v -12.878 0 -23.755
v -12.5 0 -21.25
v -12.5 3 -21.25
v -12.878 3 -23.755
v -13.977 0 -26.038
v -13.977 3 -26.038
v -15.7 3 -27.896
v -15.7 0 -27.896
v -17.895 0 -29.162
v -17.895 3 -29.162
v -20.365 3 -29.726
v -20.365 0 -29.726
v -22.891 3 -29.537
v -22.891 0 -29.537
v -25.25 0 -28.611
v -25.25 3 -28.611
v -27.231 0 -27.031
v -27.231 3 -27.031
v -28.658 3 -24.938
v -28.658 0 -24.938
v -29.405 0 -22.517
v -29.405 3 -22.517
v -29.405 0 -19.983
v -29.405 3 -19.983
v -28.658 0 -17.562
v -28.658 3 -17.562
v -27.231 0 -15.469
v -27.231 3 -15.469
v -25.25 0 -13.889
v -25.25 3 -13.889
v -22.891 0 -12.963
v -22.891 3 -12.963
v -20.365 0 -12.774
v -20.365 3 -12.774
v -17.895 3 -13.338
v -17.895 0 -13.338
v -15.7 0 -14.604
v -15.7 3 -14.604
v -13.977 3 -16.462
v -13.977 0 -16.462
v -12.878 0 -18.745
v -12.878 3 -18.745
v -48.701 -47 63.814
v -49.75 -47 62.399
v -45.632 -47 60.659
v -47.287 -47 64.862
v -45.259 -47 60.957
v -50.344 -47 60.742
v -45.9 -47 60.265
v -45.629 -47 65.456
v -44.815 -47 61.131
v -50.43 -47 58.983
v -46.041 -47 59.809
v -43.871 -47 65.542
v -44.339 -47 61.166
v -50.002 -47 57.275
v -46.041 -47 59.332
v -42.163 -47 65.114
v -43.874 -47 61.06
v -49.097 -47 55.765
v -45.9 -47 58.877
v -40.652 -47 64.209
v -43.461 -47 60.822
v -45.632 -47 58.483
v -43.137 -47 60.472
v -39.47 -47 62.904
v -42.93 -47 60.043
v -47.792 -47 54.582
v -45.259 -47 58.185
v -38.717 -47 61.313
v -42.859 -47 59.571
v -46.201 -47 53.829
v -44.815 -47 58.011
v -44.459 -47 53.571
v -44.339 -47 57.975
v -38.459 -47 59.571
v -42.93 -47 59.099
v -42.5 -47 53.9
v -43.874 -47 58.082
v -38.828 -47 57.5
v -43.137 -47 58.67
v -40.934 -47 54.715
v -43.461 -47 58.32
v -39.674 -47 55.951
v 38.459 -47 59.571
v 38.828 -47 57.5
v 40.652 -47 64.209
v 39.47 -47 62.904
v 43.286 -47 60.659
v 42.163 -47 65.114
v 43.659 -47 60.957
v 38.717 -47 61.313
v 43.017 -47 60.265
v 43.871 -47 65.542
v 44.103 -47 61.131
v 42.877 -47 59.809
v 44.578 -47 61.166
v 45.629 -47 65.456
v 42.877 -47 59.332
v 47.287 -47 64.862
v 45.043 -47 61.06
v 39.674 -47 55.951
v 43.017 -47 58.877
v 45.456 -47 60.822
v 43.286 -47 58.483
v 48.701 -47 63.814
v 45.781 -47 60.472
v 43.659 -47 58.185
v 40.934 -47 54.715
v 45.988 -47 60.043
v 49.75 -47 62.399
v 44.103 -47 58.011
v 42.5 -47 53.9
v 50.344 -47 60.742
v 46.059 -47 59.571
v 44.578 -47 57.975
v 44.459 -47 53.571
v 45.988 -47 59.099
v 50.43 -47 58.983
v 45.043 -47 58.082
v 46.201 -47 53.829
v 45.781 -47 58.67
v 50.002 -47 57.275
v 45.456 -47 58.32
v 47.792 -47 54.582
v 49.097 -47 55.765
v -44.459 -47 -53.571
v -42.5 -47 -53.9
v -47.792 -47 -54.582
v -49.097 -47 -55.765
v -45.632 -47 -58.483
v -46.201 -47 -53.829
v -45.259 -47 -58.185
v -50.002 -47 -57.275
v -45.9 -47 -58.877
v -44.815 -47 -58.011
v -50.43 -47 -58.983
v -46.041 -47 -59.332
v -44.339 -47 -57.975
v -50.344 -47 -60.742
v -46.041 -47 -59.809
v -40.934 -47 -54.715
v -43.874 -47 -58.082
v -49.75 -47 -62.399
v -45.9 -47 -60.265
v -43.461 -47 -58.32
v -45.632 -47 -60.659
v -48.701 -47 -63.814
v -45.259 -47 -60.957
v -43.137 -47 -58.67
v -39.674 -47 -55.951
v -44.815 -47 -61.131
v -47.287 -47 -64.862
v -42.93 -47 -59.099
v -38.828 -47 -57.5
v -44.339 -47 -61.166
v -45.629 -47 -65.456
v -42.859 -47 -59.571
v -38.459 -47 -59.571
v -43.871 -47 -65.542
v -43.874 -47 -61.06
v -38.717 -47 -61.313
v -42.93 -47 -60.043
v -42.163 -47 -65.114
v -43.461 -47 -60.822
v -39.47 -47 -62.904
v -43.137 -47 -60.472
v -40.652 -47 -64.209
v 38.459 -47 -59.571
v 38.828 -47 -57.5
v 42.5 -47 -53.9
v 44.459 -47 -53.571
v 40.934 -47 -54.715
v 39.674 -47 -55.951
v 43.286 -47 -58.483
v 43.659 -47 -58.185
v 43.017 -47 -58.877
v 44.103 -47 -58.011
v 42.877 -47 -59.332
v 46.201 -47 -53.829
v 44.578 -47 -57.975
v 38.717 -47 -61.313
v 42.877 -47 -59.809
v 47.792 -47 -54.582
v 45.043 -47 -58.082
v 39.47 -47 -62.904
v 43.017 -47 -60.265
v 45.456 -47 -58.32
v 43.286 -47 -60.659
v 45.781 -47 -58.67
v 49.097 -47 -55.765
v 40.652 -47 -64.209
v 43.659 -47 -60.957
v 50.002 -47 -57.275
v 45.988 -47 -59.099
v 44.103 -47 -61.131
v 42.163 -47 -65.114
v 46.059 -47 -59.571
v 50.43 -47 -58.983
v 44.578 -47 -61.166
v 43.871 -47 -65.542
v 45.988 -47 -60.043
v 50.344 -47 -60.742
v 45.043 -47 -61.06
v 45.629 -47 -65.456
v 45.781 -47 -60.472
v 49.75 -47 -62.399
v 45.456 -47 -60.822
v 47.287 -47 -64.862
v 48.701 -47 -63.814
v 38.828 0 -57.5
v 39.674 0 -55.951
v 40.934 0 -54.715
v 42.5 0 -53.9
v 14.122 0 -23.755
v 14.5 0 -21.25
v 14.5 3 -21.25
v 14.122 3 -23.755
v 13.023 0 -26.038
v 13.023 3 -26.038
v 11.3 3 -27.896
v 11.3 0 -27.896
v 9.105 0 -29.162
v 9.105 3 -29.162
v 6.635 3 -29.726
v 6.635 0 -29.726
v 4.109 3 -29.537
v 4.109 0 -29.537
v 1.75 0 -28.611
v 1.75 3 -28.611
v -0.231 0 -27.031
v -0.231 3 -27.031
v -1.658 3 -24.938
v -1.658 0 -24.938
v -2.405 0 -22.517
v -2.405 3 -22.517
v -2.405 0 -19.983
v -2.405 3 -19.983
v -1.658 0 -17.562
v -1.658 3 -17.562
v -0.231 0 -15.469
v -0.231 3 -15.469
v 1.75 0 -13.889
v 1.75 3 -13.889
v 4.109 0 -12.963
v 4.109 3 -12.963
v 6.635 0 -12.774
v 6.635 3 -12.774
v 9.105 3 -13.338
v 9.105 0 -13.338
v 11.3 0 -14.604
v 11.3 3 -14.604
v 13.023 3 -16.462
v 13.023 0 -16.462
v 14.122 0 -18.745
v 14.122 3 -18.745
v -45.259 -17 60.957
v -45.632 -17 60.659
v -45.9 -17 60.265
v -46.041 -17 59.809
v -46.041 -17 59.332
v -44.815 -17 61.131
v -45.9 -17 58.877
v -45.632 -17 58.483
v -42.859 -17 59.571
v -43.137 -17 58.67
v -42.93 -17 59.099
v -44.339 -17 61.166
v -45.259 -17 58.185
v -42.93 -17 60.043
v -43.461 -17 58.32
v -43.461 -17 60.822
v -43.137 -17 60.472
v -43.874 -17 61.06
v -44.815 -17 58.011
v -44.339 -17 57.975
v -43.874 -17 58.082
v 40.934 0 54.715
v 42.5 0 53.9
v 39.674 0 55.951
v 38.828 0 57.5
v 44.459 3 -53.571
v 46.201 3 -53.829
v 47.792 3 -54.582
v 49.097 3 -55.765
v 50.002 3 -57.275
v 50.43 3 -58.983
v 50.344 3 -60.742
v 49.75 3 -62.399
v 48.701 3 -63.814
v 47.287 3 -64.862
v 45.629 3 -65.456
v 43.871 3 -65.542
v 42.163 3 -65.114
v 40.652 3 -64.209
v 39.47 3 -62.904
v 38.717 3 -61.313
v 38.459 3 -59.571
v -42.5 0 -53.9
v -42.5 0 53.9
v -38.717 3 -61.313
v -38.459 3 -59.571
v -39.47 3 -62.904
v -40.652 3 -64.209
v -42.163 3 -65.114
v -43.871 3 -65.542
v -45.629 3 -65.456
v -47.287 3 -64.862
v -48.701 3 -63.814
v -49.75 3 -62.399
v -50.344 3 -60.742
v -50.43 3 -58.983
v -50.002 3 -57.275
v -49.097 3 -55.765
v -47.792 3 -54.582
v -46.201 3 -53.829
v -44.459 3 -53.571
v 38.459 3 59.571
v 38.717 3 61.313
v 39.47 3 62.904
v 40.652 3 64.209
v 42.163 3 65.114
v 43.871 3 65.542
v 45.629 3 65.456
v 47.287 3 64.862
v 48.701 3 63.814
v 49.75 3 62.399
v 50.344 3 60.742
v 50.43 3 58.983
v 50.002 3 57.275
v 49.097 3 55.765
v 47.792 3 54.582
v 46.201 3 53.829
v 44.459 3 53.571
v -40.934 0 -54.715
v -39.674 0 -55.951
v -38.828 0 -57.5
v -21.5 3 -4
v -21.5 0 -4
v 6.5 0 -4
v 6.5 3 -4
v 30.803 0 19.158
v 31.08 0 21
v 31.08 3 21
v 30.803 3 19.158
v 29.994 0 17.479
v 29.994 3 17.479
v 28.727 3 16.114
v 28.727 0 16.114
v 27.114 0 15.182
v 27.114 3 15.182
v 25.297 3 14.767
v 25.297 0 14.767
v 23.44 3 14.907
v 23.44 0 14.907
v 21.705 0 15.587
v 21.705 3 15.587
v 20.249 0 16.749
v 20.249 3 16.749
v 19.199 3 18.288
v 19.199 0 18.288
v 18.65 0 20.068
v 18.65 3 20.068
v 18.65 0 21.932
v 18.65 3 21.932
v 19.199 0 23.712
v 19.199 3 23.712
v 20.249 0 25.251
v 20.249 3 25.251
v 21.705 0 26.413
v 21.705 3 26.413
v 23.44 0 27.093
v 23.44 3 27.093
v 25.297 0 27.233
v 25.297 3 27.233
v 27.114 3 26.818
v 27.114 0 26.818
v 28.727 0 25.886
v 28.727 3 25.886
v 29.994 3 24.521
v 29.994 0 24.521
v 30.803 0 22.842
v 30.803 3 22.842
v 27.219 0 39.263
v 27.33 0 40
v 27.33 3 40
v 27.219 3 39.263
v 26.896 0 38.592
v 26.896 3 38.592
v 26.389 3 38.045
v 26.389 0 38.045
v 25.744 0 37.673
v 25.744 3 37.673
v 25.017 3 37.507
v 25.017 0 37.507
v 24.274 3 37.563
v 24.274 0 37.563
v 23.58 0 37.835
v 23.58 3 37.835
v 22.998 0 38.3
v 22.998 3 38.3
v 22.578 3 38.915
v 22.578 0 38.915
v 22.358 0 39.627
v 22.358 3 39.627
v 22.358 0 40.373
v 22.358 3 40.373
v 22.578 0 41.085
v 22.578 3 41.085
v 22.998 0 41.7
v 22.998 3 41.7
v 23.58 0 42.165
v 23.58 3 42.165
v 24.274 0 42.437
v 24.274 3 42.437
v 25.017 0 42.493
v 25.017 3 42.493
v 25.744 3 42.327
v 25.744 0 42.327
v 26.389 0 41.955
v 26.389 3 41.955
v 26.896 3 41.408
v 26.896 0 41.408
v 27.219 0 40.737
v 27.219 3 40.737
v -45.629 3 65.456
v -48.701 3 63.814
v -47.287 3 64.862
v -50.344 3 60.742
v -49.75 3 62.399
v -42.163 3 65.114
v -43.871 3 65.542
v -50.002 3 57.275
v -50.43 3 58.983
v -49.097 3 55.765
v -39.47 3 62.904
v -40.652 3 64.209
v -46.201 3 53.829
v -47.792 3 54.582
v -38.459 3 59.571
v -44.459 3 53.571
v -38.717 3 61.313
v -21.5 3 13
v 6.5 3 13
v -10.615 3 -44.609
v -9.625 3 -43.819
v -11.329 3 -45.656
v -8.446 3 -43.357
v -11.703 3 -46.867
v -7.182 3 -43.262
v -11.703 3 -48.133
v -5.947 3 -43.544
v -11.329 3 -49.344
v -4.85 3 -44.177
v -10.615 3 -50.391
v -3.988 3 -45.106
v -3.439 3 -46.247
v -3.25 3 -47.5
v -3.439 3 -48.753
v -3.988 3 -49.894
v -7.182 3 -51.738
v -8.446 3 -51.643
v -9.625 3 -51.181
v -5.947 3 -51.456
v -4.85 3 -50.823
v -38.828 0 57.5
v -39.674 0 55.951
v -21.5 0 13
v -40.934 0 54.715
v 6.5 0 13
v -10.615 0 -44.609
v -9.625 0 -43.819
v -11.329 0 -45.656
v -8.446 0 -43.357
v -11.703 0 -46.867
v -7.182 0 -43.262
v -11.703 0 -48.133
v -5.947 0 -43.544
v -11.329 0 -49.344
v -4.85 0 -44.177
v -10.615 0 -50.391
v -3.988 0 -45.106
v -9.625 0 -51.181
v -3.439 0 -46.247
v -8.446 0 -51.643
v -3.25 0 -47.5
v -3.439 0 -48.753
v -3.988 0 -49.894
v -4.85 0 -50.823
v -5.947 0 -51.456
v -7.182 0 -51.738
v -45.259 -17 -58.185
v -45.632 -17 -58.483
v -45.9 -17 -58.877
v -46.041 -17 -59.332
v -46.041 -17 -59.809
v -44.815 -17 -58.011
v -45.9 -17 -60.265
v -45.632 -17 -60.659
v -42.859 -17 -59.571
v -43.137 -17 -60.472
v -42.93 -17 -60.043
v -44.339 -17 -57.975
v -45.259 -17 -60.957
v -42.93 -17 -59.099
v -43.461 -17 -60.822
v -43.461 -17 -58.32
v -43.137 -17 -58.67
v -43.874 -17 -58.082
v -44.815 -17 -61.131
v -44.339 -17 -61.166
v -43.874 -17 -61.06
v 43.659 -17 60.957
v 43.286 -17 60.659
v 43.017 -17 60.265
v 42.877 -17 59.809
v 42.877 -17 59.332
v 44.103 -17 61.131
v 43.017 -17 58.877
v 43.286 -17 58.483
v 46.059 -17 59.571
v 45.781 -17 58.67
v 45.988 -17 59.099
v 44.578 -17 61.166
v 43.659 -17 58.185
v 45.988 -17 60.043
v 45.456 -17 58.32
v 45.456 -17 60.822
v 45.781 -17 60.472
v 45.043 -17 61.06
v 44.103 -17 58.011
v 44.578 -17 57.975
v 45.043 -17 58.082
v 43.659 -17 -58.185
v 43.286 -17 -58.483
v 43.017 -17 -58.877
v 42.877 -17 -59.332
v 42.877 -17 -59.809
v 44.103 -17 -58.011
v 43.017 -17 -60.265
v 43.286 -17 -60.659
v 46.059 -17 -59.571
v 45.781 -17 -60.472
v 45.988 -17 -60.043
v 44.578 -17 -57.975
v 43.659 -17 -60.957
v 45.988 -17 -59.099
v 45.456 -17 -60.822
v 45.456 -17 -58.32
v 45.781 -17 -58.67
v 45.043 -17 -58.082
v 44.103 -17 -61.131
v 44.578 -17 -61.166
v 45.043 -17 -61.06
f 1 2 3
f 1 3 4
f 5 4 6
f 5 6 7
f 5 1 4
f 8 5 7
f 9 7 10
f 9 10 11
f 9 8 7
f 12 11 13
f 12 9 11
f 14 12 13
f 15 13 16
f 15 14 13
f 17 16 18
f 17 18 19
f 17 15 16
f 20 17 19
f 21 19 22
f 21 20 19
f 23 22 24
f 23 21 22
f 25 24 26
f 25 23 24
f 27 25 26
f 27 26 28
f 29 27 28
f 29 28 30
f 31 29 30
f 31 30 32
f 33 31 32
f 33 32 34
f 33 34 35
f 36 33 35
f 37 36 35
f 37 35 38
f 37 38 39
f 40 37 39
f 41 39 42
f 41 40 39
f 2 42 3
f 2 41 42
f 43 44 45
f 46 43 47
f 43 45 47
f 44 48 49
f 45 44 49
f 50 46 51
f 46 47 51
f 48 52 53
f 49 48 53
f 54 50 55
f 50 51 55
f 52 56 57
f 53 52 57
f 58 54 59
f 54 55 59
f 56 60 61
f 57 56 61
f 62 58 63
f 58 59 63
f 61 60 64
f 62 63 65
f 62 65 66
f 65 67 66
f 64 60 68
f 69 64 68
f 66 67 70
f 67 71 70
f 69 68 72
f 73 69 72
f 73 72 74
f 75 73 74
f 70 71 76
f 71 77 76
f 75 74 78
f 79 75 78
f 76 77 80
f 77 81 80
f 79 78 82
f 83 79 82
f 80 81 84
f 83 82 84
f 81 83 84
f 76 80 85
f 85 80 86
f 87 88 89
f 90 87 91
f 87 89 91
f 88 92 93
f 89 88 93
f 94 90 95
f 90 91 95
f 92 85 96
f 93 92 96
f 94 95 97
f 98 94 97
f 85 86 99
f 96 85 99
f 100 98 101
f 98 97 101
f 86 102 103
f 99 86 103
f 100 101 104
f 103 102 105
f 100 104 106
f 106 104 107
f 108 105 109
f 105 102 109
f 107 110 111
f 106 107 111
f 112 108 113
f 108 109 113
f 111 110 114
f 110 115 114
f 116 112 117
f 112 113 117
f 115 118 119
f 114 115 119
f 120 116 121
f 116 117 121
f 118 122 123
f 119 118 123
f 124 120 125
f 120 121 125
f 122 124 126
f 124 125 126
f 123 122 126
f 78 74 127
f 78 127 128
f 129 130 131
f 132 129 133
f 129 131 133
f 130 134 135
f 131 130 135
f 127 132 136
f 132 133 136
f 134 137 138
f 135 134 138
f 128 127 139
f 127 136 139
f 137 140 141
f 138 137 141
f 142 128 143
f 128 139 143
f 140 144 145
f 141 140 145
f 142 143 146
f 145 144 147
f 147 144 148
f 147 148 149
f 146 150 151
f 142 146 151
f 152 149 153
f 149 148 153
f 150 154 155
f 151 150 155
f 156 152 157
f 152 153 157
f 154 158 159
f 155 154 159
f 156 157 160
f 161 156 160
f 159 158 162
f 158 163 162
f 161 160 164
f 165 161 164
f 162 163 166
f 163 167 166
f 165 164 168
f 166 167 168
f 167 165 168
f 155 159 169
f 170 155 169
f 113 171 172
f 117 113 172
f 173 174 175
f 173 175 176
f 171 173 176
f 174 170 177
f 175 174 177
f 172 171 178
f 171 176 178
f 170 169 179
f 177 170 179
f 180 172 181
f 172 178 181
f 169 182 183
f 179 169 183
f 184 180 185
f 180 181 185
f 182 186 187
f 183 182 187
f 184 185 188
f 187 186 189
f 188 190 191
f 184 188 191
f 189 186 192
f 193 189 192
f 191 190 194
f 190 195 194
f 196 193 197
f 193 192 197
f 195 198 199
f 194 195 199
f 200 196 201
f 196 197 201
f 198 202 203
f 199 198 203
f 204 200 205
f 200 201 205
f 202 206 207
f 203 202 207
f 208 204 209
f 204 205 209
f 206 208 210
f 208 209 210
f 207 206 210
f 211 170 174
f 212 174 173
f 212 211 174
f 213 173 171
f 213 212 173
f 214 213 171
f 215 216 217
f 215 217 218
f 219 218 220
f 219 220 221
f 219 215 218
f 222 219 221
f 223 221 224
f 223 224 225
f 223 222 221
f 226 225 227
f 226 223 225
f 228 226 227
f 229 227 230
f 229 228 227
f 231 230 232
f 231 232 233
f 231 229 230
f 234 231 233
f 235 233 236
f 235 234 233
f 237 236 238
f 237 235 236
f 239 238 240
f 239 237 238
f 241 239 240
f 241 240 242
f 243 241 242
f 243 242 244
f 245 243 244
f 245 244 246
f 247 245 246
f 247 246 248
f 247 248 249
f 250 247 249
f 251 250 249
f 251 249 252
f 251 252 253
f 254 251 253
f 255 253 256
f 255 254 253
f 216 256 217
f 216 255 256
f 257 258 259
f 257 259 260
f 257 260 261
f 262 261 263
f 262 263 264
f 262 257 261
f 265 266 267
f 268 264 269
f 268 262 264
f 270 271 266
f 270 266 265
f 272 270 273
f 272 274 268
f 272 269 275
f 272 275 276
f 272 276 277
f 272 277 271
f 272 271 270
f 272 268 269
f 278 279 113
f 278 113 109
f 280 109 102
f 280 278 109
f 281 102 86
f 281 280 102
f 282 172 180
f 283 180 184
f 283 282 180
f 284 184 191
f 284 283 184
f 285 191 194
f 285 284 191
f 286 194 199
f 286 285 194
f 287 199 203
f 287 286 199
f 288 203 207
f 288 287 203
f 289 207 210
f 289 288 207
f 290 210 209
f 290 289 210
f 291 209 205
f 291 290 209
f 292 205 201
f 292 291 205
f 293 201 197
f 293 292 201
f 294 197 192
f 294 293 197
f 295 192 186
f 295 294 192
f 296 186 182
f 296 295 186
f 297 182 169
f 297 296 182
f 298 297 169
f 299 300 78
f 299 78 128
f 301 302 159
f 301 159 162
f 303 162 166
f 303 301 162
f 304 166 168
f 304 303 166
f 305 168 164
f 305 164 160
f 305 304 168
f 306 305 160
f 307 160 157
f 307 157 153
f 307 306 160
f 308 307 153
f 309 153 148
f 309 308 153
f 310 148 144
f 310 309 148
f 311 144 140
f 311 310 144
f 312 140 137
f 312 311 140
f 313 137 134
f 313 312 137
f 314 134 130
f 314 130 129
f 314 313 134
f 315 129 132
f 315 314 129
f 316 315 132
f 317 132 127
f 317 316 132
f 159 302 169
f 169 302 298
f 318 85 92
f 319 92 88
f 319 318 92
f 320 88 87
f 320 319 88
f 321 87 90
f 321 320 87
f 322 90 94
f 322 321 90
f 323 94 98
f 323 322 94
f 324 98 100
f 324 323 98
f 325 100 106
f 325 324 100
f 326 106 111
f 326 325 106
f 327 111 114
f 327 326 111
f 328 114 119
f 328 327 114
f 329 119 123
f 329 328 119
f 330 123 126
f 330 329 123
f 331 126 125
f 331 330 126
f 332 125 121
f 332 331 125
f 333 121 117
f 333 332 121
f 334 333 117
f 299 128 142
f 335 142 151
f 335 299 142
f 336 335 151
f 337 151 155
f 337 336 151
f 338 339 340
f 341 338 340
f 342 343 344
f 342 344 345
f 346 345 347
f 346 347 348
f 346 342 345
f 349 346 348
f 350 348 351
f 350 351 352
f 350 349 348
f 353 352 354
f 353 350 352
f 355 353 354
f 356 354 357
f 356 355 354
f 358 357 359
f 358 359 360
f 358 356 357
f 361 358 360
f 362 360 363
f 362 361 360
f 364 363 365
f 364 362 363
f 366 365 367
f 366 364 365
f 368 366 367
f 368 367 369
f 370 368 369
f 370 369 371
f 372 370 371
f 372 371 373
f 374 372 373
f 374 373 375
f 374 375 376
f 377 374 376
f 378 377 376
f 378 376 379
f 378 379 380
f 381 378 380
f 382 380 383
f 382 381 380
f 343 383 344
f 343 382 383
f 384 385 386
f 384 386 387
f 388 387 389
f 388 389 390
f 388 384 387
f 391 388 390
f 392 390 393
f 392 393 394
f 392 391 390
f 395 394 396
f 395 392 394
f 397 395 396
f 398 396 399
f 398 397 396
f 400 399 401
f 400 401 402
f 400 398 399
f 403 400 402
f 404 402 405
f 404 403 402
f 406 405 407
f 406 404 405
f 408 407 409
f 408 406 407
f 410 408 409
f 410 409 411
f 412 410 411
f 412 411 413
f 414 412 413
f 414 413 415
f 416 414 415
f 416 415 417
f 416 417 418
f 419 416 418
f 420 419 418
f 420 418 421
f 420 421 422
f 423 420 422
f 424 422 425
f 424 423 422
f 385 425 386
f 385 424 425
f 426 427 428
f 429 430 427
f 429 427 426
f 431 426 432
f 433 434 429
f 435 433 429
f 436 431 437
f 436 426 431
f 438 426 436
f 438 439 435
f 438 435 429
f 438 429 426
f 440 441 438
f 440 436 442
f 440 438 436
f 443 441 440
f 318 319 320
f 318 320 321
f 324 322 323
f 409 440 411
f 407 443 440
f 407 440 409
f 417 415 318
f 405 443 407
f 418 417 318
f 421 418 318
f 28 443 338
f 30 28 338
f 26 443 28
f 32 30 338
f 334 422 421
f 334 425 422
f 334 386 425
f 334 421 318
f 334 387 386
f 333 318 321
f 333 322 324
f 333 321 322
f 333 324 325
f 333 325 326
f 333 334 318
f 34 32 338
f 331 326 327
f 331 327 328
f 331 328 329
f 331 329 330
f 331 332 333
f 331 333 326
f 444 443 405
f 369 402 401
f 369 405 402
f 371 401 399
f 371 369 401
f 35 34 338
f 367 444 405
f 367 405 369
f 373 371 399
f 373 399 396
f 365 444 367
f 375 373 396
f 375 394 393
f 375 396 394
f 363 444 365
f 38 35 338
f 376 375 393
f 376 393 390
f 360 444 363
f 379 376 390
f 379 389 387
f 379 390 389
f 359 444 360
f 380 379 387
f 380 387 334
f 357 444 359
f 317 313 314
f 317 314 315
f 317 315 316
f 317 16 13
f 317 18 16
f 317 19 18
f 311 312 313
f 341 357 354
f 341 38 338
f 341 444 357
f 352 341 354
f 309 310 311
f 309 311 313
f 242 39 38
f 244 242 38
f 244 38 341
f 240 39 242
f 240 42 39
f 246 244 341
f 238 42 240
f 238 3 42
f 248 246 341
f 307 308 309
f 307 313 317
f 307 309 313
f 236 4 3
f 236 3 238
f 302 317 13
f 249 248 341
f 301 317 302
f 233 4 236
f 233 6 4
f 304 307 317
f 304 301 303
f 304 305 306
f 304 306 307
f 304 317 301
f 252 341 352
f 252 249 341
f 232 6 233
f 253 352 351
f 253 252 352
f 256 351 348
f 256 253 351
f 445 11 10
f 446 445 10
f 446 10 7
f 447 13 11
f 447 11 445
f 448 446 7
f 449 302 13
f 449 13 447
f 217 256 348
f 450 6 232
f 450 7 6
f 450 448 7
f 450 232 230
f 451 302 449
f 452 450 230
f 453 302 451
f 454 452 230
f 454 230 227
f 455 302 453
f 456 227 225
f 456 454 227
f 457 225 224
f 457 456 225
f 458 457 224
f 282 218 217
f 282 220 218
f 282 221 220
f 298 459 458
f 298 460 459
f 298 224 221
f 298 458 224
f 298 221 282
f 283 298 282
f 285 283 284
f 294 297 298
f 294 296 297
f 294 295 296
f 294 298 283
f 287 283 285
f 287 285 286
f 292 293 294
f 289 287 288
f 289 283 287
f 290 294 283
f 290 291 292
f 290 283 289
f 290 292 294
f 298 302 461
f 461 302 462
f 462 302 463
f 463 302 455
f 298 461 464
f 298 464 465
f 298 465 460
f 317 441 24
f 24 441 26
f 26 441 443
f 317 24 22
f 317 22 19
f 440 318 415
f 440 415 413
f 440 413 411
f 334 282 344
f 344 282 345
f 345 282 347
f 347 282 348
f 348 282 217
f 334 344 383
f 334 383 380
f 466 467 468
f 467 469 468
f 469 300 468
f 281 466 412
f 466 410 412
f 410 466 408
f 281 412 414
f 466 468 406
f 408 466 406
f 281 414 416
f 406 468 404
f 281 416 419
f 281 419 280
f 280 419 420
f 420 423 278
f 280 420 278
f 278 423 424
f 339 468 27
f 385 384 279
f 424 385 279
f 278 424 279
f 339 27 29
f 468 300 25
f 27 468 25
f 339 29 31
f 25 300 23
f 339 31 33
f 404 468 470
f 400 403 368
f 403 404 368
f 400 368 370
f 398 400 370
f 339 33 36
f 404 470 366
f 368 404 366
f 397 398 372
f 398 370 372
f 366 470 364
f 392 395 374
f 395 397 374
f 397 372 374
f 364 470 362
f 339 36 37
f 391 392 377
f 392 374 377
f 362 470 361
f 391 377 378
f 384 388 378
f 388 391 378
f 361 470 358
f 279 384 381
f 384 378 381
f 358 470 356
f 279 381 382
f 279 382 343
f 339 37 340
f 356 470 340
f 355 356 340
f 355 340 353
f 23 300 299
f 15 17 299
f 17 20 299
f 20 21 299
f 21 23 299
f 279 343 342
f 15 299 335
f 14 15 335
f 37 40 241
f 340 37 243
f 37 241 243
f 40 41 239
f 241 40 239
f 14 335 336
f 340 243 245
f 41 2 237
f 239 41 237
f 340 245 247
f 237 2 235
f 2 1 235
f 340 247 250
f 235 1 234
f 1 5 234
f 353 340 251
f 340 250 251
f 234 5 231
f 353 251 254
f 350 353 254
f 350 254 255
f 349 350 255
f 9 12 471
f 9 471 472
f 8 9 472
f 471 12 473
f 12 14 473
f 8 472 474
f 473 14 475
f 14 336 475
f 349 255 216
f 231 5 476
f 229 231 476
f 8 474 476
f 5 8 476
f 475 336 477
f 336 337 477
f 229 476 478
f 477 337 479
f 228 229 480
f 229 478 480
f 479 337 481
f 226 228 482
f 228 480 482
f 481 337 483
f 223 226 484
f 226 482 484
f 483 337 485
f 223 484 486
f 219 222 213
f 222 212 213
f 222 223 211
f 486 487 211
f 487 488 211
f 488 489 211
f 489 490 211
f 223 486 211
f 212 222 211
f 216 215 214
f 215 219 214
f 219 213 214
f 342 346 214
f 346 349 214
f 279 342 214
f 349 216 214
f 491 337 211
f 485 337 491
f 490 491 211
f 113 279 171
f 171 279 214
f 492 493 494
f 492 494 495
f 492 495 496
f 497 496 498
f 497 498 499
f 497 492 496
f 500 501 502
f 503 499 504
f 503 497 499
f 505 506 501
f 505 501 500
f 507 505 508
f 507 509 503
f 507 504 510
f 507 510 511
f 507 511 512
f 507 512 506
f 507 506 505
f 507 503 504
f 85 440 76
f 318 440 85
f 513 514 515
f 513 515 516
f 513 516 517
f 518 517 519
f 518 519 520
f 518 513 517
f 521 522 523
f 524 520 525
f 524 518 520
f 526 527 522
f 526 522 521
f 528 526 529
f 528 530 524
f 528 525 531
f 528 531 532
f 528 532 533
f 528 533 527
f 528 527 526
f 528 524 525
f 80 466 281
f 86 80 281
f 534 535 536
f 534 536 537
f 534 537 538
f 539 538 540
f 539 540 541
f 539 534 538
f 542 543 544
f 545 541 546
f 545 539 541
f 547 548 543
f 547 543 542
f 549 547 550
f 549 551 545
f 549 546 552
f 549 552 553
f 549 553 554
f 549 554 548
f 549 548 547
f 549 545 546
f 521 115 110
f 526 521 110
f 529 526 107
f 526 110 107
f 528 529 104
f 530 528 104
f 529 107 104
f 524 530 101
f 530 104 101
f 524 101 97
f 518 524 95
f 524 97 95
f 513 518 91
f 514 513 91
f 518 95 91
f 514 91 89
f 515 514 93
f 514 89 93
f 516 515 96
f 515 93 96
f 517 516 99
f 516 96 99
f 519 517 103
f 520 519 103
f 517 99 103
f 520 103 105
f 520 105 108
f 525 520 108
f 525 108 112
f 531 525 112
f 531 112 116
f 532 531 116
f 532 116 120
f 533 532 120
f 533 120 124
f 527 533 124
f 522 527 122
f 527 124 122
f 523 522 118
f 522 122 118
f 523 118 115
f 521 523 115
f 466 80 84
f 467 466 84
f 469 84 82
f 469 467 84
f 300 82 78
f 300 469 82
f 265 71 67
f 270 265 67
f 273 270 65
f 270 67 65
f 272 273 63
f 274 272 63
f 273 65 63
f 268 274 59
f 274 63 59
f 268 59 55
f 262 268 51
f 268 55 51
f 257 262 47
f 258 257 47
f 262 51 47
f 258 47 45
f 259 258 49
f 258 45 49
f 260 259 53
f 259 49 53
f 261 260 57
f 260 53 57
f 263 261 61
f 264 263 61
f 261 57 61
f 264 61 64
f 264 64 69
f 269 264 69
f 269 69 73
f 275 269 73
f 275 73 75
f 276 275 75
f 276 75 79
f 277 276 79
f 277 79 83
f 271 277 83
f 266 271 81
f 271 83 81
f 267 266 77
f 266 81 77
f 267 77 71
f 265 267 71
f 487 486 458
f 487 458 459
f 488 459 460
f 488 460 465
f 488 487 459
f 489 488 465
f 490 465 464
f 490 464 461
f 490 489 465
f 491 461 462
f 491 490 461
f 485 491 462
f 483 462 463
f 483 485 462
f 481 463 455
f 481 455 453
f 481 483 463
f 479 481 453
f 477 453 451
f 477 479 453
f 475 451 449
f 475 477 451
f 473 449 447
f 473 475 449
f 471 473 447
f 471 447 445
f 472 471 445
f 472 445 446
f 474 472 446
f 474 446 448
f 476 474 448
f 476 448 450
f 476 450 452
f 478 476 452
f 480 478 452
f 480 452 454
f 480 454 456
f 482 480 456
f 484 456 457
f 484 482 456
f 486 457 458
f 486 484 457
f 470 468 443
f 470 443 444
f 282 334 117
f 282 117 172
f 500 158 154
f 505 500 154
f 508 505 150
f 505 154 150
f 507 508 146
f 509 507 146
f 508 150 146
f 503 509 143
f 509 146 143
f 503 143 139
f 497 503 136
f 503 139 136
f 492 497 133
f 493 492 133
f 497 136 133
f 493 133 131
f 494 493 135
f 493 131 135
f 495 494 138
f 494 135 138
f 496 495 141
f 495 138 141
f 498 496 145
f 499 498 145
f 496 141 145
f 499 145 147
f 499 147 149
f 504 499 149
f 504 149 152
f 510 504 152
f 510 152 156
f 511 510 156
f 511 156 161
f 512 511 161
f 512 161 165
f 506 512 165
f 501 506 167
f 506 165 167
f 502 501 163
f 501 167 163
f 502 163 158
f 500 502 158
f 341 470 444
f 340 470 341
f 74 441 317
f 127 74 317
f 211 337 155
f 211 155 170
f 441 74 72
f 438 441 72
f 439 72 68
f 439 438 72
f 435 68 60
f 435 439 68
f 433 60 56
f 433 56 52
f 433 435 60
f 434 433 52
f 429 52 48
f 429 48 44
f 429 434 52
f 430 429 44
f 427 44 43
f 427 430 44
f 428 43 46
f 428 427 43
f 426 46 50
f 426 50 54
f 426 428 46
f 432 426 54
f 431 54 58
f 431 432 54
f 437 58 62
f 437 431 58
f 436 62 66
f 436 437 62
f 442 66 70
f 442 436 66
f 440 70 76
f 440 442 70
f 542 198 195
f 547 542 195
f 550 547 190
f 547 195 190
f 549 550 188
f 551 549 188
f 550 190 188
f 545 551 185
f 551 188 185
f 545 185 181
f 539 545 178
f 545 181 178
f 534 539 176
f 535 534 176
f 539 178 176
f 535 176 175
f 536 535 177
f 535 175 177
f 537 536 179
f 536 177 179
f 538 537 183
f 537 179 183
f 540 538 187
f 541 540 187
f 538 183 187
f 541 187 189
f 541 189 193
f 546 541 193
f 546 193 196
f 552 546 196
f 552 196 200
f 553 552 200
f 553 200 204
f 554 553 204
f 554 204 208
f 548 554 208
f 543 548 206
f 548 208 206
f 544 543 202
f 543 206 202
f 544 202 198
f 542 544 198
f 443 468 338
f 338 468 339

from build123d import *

# Parameters (mm, degrees)
SKETCH1_W           = 85
SKETCH1_H           = 115
SKETCH1_R           = 4.25
SKETCH1_R_2         = 8.5
SKETCH1_R_3         = 6.25
SKETCH1_R_4         = 2.5
SKETCH1_W_2         = 28
SKETCH1_H_2         = 17
BOSS_EXTRUDE1_DEPTH = 3
SKETCH2_W           = 88.917707464
SKETCH2_H           = 119.141928202
SKETCH2_W_2         = 85
SKETCH2_H_2         = 115
BOSS_EXTRUDE2_DEPTH = 50
SKETCH3_R           = 6
BOSS_EXTRUDE3_DEPTH = 50
SKETCH5_R           = 1.6
CUT_EXTRUDE1_DEPTH  = 30


with BuildPart() as part:
    # Sketch1 → Boss-Extrude1 (new body)
    with BuildSketch(Plane(origin=(0, 0, 0), x_dir=(1, 0, 0), z_dir=(0, 1, 0))):
        Rectangle(SKETCH1_W, SKETCH1_H)
        with Locations((-7.5, 47.5)):
            Circle(SKETCH1_R, mode=Mode.SUBTRACT)
        with Locations((-21, 21.25)):
            Circle(SKETCH1_R_2, mode=Mode.SUBTRACT)
        with Locations((6, 21.25)):
            Circle(SKETCH1_R_2, mode=Mode.SUBTRACT)
        with Locations((24.83030278, -21)):
            Circle(SKETCH1_R_3, mode=Mode.SUBTRACT)
        with Locations((24.83030278, -40)):
            Circle(SKETCH1_R_4, mode=Mode.SUBTRACT)
        with Locations((-7.5, -4.5)):
            Rectangle(SKETCH1_W_2, SKETCH1_H_2, mode=Mode.SUBTRACT)
    extrude(amount=BOSS_EXTRUDE1_DEPTH)

    # Sketch2 → Boss-Extrude2 (add)
    with BuildSketch(Plane(origin=(0, 3, 0), x_dir=(1, 0, 0), z_dir=(0, 1, 0))):
        Rectangle(SKETCH2_W, SKETCH2_H)
        Rectangle(SKETCH2_W_2, SKETCH2_H_2, mode=Mode.SUBTRACT)
    extrude(amount=-BOSS_EXTRUDE2_DEPTH)

    # Sketch3 → Boss-Extrude3 (add)
    with BuildSketch(Plane(origin=(0, 3, 0), x_dir=(1, 0, 0), z_dir=(0, 1, 0))):
        with Locations((44.458853732, 59.570964101)):
            Circle(SKETCH3_R)
        with Locations((-44.458853732, 59.570964101)):
            Circle(SKETCH3_R)
        with Locations((44.458853732, -59.570964101)):
            Circle(SKETCH3_R)
        with Locations((-44.458853732, -59.570964101)):
            Circle(SKETCH3_R)
    extrude(amount=-BOSS_EXTRUDE3_DEPTH)

    # Sketch5 → Cut-Extrude1 (cut)
    with BuildSketch(Plane.XZ.offset(47)):
        with Locations((-44.458853732, 59.570964101)):
            Circle(SKETCH5_R)
        with Locations((44.458853732, 59.570964101)):
            Circle(SKETCH5_R)
        with Locations((44.458853732, -59.570964101)):
            Circle(SKETCH5_R)
        with Locations((-44.458853732, -59.570964101)):
            Circle(SKETCH5_R)
    extrude(amount=-CUT_EXTRUDE1_DEPTH, mode=Mode.SUBTRACT)


solid = part.part
